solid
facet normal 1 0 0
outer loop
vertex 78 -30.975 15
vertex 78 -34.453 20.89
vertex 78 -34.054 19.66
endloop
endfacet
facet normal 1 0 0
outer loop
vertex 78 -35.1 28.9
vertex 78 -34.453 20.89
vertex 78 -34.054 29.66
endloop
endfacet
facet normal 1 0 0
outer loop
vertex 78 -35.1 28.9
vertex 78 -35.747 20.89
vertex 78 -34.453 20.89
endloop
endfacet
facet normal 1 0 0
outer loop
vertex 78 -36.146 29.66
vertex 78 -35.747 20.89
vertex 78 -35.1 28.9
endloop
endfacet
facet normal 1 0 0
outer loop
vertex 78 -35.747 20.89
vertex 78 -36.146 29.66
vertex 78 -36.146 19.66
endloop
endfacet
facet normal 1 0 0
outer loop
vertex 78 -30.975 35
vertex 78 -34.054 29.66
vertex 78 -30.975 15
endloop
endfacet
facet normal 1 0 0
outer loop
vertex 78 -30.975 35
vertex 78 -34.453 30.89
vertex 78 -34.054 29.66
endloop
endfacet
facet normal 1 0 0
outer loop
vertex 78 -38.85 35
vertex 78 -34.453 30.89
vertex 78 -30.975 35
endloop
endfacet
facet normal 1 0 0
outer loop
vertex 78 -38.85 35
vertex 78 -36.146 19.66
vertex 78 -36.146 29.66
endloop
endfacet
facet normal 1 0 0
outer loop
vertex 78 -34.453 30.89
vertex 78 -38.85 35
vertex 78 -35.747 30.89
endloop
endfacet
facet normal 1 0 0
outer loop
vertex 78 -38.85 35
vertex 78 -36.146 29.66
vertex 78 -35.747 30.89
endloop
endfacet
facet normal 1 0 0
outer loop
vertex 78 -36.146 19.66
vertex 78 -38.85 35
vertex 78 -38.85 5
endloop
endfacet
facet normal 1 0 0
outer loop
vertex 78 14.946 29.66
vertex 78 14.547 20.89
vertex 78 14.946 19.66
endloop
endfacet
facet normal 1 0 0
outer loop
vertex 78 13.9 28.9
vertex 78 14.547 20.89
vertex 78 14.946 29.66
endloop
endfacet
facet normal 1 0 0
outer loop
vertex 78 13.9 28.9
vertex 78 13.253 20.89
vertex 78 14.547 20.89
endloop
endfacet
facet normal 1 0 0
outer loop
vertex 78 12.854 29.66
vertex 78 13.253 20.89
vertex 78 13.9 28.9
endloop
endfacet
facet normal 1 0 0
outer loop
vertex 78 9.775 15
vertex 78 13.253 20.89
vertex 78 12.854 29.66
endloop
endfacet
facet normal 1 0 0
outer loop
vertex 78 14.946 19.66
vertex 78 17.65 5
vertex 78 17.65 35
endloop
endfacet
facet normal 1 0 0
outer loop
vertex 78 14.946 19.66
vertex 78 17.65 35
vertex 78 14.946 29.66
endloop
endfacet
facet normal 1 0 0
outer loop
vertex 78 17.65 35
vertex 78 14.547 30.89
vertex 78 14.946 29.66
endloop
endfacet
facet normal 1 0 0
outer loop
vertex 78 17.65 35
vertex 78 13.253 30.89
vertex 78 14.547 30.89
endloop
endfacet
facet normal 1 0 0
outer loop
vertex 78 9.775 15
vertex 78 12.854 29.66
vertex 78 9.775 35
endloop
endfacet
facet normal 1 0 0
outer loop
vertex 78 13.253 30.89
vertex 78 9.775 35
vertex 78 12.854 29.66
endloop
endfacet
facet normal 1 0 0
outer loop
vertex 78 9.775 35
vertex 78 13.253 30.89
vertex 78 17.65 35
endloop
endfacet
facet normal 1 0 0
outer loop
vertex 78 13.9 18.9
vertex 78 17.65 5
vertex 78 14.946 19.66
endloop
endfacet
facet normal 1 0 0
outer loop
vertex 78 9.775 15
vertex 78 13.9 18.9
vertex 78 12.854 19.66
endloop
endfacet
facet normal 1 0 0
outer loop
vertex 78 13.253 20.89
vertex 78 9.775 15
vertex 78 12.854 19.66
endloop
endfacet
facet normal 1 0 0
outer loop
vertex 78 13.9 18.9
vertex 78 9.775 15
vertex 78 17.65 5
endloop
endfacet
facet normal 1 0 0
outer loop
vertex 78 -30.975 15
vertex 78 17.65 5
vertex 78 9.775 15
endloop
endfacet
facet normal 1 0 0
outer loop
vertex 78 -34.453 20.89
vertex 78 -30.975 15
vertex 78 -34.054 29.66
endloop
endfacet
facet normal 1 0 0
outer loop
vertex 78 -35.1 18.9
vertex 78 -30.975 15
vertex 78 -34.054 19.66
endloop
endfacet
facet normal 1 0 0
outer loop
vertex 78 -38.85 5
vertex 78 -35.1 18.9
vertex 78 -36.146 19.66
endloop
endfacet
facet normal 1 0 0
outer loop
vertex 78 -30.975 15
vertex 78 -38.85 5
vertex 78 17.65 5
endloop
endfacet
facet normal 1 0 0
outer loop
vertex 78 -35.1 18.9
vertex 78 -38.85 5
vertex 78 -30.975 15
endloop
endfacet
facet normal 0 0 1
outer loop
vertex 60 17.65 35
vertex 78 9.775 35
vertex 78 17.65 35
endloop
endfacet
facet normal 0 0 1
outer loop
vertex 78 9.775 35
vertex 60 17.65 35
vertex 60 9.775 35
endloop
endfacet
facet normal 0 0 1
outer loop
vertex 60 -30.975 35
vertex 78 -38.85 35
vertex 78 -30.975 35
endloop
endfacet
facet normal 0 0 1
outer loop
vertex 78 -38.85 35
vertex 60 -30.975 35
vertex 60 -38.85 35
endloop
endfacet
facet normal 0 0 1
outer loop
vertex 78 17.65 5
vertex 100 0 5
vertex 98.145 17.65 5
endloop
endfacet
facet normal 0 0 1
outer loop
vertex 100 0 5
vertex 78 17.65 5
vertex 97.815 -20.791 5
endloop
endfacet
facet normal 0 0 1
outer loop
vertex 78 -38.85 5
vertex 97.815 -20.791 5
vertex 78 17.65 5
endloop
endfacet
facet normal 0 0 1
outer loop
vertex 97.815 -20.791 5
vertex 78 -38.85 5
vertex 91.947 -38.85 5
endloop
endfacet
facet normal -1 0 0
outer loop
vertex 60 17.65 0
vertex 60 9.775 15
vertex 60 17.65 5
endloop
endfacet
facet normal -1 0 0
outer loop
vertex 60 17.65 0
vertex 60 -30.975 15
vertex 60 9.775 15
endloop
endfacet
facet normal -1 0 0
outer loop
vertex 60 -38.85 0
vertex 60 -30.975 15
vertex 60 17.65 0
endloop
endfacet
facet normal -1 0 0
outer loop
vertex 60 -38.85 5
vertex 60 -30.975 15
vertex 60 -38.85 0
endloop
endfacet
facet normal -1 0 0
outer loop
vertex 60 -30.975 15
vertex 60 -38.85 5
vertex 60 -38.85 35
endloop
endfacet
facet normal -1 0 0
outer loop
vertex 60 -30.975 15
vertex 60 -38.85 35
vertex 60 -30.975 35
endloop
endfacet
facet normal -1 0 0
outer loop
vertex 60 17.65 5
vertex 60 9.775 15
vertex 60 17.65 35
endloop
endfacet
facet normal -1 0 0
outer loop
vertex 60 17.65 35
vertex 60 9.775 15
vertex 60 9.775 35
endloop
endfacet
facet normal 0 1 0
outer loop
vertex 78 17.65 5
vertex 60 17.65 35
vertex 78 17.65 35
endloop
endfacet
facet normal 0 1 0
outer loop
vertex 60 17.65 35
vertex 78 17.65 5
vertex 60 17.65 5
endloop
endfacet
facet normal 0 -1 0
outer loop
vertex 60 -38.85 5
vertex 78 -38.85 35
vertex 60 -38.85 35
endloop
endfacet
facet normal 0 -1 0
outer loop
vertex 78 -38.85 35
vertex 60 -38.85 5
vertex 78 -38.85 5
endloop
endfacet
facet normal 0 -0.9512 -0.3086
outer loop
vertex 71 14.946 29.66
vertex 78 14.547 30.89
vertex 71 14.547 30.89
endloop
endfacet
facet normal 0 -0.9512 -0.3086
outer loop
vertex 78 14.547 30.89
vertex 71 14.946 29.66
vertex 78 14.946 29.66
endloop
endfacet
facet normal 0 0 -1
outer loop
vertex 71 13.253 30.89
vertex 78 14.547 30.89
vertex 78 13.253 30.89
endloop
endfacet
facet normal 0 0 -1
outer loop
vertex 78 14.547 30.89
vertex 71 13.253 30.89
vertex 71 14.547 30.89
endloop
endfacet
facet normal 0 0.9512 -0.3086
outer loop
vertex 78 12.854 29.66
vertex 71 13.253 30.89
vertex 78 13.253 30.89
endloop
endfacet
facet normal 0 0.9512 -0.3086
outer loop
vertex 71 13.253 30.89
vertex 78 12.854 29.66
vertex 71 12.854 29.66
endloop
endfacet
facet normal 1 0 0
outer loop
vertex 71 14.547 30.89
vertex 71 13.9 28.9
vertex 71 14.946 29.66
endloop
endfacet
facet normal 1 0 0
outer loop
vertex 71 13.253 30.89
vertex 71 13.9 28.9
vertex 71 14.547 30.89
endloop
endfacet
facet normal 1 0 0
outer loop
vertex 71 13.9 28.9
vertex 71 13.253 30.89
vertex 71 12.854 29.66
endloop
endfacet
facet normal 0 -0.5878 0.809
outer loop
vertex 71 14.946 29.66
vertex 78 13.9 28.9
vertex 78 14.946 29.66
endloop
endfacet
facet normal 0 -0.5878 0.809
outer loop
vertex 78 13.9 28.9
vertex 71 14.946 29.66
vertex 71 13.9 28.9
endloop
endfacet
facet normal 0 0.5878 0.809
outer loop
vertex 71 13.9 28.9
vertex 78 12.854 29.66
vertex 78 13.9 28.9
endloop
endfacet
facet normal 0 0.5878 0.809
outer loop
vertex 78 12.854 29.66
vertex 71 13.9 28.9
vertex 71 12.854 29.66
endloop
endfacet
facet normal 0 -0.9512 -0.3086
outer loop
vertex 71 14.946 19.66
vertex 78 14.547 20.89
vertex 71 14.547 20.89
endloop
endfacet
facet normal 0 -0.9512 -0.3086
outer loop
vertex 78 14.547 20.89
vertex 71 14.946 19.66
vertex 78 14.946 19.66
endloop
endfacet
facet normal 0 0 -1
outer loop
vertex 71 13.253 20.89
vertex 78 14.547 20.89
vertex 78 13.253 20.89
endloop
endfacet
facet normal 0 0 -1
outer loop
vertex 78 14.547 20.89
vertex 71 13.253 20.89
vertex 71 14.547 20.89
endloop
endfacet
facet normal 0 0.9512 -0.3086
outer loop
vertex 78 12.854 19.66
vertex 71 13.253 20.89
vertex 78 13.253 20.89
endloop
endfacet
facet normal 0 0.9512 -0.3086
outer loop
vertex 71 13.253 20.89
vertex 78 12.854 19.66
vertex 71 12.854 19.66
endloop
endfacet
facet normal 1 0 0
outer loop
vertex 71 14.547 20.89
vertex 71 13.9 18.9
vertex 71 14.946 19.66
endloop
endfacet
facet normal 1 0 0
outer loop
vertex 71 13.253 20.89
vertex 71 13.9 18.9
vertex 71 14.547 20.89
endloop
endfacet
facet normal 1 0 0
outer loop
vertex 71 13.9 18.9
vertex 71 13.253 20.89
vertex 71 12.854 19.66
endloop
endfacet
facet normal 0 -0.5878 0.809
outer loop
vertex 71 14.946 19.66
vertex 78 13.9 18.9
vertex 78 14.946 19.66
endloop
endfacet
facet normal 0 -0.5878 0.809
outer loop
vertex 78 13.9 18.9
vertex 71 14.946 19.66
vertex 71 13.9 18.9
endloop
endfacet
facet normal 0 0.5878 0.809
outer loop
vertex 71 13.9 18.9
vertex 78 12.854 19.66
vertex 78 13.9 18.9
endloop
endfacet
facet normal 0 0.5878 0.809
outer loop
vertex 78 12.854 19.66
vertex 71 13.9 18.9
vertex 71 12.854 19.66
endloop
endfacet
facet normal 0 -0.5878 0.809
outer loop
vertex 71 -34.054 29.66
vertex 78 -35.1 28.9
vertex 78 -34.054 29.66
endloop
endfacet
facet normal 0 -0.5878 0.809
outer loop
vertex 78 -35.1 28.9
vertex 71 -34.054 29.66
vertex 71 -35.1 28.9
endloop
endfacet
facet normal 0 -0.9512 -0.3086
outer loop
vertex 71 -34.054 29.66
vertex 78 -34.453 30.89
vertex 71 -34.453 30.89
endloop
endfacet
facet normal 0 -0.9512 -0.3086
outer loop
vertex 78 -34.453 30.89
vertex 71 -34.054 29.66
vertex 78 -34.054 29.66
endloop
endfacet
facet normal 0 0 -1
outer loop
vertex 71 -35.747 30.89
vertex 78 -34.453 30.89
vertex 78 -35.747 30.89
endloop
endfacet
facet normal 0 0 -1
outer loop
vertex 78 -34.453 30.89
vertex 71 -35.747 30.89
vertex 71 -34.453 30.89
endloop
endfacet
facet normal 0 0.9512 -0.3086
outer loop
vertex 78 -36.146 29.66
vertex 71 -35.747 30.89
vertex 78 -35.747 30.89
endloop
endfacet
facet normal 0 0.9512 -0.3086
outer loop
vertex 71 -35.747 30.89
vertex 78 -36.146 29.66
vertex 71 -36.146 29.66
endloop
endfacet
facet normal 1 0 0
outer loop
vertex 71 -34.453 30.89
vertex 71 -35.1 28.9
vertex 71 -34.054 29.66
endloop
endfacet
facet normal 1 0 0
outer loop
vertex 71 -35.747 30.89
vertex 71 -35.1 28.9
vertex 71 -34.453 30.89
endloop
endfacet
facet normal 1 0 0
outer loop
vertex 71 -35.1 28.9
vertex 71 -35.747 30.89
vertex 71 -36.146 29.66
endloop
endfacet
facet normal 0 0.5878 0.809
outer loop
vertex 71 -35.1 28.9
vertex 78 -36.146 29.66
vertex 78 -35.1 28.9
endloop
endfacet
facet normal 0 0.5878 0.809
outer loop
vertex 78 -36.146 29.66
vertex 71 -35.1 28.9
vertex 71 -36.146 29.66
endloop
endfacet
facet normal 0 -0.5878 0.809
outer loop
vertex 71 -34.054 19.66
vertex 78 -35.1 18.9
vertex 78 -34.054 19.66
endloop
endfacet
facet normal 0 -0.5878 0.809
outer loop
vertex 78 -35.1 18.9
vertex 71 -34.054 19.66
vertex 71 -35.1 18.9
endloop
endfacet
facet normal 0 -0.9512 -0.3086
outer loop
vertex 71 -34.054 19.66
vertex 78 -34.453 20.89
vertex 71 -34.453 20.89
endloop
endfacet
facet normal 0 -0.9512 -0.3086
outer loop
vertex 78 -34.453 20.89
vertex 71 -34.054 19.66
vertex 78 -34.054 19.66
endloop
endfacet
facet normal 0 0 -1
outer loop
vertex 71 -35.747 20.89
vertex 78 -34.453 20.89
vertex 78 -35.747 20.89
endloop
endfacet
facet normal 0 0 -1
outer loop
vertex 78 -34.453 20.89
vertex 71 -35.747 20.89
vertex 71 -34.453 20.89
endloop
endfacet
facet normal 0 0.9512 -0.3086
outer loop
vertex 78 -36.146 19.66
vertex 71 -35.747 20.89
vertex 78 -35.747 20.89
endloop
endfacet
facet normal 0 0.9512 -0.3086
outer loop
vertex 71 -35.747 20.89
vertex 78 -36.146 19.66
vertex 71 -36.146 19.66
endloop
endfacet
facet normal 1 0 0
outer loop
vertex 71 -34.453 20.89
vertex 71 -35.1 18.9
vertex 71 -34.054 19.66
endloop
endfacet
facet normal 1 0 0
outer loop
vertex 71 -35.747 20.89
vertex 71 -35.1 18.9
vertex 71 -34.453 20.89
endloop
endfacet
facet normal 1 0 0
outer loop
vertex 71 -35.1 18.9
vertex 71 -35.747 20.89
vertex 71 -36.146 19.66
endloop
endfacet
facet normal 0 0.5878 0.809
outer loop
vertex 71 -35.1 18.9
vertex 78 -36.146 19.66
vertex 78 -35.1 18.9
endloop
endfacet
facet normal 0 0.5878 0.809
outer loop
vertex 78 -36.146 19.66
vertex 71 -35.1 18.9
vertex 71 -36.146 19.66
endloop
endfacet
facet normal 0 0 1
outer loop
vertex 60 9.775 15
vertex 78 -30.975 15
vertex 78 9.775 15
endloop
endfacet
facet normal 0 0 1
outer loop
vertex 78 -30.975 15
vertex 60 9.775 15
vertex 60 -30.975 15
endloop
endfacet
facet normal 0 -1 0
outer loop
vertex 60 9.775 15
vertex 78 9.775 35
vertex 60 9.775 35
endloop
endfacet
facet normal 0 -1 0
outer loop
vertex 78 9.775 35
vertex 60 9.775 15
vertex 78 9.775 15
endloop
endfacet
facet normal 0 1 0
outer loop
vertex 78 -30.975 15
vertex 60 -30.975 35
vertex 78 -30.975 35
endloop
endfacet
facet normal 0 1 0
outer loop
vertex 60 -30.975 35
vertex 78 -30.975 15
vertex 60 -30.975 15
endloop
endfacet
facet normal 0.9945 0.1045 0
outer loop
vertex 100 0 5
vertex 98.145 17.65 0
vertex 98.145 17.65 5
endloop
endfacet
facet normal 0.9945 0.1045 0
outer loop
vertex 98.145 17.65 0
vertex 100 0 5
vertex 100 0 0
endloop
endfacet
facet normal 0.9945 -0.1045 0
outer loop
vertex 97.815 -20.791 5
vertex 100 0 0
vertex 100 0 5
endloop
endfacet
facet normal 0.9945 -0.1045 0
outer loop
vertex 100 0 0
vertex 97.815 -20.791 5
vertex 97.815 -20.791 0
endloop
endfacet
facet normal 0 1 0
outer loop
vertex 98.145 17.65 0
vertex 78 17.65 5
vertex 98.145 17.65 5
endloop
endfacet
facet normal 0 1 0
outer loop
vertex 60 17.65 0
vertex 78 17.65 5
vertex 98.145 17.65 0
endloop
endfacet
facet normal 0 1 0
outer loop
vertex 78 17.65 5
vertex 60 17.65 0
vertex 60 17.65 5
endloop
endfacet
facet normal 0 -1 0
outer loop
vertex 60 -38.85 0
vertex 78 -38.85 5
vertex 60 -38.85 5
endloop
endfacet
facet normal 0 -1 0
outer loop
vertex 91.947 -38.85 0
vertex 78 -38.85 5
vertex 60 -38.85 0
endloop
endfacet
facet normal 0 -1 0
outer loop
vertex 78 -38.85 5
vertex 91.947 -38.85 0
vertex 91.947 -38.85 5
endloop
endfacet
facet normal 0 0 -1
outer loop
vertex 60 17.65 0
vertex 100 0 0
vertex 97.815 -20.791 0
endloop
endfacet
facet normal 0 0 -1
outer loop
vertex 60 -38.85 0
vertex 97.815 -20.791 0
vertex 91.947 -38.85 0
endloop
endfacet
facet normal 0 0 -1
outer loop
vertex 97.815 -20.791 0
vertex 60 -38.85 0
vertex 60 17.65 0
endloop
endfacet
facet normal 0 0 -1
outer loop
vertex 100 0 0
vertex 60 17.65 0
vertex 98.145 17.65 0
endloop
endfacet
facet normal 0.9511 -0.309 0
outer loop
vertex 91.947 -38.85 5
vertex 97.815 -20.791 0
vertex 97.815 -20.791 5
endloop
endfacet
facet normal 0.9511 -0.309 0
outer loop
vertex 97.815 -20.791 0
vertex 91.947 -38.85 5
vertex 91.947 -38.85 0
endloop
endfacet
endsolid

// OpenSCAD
clearance = 0.25;
cutExtra = 0.2;
servoHeight = 20;
servoDepth = 40.5;
servoSupportWidth = 18;
servoDriveGearOffset = 10.6;
servoMountingScrewHolesYDistance = 49;
servoMountingScrewHolesZDistance = 10;
servoMountingScrewHoleBaseDepth = 7;
servoMountingScrewRadius = 1.15;
servoSupportToDriveWidth = 22;

// sample
motorSupport(supportRadius = 100, driveGearVerticalPosition = 25);

module motorSupport(supportRadius, driveGearVerticalPosition) {
  baseHeight = 5;
  baseWidth = servoSupportWidth + servoSupportToDriveWidth;
  baseDepth = servoDepth + (servoMountingScrewHoleBaseDepth + 1) * 2;
  
  supportHeight = servoHeight + driveGearVerticalPosition - baseHeight - servoHeight / 2;
  supportWidth = servoSupportWidth;
  supportDepth = baseDepth;

  motorHoleWidth = supportWidth + cutExtra * 2;
  motorHoleDepth = servoDepth + clearance;

  screwHoleRadius = servoMountingScrewRadius - 0.05;
  screwHoleHeight = 7;
  screwHoleXOffset = supportRadius - baseWidth + supportWidth - screwHoleHeight;
  screwHoleYOffset = servoMountingScrewHolesYDistance / 2;
  screwHoleZOffset = driveGearVerticalPosition;

  // base
  linear_extrude(baseHeight)
  intersection() {
    circle(supportRadius);

    translate([supportRadius - baseWidth, -baseDepth / 2 - servoDriveGearOffset])
    square([baseWidth, baseDepth]);
  }

  translate([0, -servoDriveGearOffset, 0])
  difference() {
    // support
    translate([supportRadius - baseWidth, -supportDepth / 2, baseHeight])
    cube([supportWidth, supportDepth, supportHeight]);
    
    // screw hole 1.1
    translate([screwHoleXOffset, screwHoleYOffset, screwHoleZOffset + servoMountingScrewHolesZDistance / 2])
    rotate(90, [0, 1, 0])
    cylinder(h = screwHoleHeight + cutExtra, r = screwHoleRadius);

    // screw hole 1.2
    translate([screwHoleXOffset, screwHoleYOffset, screwHoleZOffset - servoMountingScrewHolesZDistance / 2])
    rotate(90, [0, 1, 0])
    cylinder(h = screwHoleHeight + cutExtra, r = screwHoleRadius);
    
    // screw hole 2.1
    translate([screwHoleXOffset, -screwHoleYOffset, screwHoleZOffset + servoMountingScrewHolesZDistance / 2])
    rotate(90, [0, 1, 0])
    cylinder(h = screwHoleHeight + cutExtra, r = screwHoleRadius);

    // screw hole 2.2
    translate([screwHoleXOffset, -screwHoleYOffset, screwHoleZOffset - servoMountingScrewHolesZDistance / 2])
    rotate(90, [0, 1, 0])
    cylinder(h = screwHoleHeight + cutExtra, r = screwHoleRadius);


    // motor hole
    translate([supportRadius - baseWidth - cutExtra, -motorHoleDepth / 2, baseHeight + (supportHeight - servoHeight)])
    cube([motorHoleWidth, motorHoleDepth, servoHeight + cutExtra]);
  }
}
